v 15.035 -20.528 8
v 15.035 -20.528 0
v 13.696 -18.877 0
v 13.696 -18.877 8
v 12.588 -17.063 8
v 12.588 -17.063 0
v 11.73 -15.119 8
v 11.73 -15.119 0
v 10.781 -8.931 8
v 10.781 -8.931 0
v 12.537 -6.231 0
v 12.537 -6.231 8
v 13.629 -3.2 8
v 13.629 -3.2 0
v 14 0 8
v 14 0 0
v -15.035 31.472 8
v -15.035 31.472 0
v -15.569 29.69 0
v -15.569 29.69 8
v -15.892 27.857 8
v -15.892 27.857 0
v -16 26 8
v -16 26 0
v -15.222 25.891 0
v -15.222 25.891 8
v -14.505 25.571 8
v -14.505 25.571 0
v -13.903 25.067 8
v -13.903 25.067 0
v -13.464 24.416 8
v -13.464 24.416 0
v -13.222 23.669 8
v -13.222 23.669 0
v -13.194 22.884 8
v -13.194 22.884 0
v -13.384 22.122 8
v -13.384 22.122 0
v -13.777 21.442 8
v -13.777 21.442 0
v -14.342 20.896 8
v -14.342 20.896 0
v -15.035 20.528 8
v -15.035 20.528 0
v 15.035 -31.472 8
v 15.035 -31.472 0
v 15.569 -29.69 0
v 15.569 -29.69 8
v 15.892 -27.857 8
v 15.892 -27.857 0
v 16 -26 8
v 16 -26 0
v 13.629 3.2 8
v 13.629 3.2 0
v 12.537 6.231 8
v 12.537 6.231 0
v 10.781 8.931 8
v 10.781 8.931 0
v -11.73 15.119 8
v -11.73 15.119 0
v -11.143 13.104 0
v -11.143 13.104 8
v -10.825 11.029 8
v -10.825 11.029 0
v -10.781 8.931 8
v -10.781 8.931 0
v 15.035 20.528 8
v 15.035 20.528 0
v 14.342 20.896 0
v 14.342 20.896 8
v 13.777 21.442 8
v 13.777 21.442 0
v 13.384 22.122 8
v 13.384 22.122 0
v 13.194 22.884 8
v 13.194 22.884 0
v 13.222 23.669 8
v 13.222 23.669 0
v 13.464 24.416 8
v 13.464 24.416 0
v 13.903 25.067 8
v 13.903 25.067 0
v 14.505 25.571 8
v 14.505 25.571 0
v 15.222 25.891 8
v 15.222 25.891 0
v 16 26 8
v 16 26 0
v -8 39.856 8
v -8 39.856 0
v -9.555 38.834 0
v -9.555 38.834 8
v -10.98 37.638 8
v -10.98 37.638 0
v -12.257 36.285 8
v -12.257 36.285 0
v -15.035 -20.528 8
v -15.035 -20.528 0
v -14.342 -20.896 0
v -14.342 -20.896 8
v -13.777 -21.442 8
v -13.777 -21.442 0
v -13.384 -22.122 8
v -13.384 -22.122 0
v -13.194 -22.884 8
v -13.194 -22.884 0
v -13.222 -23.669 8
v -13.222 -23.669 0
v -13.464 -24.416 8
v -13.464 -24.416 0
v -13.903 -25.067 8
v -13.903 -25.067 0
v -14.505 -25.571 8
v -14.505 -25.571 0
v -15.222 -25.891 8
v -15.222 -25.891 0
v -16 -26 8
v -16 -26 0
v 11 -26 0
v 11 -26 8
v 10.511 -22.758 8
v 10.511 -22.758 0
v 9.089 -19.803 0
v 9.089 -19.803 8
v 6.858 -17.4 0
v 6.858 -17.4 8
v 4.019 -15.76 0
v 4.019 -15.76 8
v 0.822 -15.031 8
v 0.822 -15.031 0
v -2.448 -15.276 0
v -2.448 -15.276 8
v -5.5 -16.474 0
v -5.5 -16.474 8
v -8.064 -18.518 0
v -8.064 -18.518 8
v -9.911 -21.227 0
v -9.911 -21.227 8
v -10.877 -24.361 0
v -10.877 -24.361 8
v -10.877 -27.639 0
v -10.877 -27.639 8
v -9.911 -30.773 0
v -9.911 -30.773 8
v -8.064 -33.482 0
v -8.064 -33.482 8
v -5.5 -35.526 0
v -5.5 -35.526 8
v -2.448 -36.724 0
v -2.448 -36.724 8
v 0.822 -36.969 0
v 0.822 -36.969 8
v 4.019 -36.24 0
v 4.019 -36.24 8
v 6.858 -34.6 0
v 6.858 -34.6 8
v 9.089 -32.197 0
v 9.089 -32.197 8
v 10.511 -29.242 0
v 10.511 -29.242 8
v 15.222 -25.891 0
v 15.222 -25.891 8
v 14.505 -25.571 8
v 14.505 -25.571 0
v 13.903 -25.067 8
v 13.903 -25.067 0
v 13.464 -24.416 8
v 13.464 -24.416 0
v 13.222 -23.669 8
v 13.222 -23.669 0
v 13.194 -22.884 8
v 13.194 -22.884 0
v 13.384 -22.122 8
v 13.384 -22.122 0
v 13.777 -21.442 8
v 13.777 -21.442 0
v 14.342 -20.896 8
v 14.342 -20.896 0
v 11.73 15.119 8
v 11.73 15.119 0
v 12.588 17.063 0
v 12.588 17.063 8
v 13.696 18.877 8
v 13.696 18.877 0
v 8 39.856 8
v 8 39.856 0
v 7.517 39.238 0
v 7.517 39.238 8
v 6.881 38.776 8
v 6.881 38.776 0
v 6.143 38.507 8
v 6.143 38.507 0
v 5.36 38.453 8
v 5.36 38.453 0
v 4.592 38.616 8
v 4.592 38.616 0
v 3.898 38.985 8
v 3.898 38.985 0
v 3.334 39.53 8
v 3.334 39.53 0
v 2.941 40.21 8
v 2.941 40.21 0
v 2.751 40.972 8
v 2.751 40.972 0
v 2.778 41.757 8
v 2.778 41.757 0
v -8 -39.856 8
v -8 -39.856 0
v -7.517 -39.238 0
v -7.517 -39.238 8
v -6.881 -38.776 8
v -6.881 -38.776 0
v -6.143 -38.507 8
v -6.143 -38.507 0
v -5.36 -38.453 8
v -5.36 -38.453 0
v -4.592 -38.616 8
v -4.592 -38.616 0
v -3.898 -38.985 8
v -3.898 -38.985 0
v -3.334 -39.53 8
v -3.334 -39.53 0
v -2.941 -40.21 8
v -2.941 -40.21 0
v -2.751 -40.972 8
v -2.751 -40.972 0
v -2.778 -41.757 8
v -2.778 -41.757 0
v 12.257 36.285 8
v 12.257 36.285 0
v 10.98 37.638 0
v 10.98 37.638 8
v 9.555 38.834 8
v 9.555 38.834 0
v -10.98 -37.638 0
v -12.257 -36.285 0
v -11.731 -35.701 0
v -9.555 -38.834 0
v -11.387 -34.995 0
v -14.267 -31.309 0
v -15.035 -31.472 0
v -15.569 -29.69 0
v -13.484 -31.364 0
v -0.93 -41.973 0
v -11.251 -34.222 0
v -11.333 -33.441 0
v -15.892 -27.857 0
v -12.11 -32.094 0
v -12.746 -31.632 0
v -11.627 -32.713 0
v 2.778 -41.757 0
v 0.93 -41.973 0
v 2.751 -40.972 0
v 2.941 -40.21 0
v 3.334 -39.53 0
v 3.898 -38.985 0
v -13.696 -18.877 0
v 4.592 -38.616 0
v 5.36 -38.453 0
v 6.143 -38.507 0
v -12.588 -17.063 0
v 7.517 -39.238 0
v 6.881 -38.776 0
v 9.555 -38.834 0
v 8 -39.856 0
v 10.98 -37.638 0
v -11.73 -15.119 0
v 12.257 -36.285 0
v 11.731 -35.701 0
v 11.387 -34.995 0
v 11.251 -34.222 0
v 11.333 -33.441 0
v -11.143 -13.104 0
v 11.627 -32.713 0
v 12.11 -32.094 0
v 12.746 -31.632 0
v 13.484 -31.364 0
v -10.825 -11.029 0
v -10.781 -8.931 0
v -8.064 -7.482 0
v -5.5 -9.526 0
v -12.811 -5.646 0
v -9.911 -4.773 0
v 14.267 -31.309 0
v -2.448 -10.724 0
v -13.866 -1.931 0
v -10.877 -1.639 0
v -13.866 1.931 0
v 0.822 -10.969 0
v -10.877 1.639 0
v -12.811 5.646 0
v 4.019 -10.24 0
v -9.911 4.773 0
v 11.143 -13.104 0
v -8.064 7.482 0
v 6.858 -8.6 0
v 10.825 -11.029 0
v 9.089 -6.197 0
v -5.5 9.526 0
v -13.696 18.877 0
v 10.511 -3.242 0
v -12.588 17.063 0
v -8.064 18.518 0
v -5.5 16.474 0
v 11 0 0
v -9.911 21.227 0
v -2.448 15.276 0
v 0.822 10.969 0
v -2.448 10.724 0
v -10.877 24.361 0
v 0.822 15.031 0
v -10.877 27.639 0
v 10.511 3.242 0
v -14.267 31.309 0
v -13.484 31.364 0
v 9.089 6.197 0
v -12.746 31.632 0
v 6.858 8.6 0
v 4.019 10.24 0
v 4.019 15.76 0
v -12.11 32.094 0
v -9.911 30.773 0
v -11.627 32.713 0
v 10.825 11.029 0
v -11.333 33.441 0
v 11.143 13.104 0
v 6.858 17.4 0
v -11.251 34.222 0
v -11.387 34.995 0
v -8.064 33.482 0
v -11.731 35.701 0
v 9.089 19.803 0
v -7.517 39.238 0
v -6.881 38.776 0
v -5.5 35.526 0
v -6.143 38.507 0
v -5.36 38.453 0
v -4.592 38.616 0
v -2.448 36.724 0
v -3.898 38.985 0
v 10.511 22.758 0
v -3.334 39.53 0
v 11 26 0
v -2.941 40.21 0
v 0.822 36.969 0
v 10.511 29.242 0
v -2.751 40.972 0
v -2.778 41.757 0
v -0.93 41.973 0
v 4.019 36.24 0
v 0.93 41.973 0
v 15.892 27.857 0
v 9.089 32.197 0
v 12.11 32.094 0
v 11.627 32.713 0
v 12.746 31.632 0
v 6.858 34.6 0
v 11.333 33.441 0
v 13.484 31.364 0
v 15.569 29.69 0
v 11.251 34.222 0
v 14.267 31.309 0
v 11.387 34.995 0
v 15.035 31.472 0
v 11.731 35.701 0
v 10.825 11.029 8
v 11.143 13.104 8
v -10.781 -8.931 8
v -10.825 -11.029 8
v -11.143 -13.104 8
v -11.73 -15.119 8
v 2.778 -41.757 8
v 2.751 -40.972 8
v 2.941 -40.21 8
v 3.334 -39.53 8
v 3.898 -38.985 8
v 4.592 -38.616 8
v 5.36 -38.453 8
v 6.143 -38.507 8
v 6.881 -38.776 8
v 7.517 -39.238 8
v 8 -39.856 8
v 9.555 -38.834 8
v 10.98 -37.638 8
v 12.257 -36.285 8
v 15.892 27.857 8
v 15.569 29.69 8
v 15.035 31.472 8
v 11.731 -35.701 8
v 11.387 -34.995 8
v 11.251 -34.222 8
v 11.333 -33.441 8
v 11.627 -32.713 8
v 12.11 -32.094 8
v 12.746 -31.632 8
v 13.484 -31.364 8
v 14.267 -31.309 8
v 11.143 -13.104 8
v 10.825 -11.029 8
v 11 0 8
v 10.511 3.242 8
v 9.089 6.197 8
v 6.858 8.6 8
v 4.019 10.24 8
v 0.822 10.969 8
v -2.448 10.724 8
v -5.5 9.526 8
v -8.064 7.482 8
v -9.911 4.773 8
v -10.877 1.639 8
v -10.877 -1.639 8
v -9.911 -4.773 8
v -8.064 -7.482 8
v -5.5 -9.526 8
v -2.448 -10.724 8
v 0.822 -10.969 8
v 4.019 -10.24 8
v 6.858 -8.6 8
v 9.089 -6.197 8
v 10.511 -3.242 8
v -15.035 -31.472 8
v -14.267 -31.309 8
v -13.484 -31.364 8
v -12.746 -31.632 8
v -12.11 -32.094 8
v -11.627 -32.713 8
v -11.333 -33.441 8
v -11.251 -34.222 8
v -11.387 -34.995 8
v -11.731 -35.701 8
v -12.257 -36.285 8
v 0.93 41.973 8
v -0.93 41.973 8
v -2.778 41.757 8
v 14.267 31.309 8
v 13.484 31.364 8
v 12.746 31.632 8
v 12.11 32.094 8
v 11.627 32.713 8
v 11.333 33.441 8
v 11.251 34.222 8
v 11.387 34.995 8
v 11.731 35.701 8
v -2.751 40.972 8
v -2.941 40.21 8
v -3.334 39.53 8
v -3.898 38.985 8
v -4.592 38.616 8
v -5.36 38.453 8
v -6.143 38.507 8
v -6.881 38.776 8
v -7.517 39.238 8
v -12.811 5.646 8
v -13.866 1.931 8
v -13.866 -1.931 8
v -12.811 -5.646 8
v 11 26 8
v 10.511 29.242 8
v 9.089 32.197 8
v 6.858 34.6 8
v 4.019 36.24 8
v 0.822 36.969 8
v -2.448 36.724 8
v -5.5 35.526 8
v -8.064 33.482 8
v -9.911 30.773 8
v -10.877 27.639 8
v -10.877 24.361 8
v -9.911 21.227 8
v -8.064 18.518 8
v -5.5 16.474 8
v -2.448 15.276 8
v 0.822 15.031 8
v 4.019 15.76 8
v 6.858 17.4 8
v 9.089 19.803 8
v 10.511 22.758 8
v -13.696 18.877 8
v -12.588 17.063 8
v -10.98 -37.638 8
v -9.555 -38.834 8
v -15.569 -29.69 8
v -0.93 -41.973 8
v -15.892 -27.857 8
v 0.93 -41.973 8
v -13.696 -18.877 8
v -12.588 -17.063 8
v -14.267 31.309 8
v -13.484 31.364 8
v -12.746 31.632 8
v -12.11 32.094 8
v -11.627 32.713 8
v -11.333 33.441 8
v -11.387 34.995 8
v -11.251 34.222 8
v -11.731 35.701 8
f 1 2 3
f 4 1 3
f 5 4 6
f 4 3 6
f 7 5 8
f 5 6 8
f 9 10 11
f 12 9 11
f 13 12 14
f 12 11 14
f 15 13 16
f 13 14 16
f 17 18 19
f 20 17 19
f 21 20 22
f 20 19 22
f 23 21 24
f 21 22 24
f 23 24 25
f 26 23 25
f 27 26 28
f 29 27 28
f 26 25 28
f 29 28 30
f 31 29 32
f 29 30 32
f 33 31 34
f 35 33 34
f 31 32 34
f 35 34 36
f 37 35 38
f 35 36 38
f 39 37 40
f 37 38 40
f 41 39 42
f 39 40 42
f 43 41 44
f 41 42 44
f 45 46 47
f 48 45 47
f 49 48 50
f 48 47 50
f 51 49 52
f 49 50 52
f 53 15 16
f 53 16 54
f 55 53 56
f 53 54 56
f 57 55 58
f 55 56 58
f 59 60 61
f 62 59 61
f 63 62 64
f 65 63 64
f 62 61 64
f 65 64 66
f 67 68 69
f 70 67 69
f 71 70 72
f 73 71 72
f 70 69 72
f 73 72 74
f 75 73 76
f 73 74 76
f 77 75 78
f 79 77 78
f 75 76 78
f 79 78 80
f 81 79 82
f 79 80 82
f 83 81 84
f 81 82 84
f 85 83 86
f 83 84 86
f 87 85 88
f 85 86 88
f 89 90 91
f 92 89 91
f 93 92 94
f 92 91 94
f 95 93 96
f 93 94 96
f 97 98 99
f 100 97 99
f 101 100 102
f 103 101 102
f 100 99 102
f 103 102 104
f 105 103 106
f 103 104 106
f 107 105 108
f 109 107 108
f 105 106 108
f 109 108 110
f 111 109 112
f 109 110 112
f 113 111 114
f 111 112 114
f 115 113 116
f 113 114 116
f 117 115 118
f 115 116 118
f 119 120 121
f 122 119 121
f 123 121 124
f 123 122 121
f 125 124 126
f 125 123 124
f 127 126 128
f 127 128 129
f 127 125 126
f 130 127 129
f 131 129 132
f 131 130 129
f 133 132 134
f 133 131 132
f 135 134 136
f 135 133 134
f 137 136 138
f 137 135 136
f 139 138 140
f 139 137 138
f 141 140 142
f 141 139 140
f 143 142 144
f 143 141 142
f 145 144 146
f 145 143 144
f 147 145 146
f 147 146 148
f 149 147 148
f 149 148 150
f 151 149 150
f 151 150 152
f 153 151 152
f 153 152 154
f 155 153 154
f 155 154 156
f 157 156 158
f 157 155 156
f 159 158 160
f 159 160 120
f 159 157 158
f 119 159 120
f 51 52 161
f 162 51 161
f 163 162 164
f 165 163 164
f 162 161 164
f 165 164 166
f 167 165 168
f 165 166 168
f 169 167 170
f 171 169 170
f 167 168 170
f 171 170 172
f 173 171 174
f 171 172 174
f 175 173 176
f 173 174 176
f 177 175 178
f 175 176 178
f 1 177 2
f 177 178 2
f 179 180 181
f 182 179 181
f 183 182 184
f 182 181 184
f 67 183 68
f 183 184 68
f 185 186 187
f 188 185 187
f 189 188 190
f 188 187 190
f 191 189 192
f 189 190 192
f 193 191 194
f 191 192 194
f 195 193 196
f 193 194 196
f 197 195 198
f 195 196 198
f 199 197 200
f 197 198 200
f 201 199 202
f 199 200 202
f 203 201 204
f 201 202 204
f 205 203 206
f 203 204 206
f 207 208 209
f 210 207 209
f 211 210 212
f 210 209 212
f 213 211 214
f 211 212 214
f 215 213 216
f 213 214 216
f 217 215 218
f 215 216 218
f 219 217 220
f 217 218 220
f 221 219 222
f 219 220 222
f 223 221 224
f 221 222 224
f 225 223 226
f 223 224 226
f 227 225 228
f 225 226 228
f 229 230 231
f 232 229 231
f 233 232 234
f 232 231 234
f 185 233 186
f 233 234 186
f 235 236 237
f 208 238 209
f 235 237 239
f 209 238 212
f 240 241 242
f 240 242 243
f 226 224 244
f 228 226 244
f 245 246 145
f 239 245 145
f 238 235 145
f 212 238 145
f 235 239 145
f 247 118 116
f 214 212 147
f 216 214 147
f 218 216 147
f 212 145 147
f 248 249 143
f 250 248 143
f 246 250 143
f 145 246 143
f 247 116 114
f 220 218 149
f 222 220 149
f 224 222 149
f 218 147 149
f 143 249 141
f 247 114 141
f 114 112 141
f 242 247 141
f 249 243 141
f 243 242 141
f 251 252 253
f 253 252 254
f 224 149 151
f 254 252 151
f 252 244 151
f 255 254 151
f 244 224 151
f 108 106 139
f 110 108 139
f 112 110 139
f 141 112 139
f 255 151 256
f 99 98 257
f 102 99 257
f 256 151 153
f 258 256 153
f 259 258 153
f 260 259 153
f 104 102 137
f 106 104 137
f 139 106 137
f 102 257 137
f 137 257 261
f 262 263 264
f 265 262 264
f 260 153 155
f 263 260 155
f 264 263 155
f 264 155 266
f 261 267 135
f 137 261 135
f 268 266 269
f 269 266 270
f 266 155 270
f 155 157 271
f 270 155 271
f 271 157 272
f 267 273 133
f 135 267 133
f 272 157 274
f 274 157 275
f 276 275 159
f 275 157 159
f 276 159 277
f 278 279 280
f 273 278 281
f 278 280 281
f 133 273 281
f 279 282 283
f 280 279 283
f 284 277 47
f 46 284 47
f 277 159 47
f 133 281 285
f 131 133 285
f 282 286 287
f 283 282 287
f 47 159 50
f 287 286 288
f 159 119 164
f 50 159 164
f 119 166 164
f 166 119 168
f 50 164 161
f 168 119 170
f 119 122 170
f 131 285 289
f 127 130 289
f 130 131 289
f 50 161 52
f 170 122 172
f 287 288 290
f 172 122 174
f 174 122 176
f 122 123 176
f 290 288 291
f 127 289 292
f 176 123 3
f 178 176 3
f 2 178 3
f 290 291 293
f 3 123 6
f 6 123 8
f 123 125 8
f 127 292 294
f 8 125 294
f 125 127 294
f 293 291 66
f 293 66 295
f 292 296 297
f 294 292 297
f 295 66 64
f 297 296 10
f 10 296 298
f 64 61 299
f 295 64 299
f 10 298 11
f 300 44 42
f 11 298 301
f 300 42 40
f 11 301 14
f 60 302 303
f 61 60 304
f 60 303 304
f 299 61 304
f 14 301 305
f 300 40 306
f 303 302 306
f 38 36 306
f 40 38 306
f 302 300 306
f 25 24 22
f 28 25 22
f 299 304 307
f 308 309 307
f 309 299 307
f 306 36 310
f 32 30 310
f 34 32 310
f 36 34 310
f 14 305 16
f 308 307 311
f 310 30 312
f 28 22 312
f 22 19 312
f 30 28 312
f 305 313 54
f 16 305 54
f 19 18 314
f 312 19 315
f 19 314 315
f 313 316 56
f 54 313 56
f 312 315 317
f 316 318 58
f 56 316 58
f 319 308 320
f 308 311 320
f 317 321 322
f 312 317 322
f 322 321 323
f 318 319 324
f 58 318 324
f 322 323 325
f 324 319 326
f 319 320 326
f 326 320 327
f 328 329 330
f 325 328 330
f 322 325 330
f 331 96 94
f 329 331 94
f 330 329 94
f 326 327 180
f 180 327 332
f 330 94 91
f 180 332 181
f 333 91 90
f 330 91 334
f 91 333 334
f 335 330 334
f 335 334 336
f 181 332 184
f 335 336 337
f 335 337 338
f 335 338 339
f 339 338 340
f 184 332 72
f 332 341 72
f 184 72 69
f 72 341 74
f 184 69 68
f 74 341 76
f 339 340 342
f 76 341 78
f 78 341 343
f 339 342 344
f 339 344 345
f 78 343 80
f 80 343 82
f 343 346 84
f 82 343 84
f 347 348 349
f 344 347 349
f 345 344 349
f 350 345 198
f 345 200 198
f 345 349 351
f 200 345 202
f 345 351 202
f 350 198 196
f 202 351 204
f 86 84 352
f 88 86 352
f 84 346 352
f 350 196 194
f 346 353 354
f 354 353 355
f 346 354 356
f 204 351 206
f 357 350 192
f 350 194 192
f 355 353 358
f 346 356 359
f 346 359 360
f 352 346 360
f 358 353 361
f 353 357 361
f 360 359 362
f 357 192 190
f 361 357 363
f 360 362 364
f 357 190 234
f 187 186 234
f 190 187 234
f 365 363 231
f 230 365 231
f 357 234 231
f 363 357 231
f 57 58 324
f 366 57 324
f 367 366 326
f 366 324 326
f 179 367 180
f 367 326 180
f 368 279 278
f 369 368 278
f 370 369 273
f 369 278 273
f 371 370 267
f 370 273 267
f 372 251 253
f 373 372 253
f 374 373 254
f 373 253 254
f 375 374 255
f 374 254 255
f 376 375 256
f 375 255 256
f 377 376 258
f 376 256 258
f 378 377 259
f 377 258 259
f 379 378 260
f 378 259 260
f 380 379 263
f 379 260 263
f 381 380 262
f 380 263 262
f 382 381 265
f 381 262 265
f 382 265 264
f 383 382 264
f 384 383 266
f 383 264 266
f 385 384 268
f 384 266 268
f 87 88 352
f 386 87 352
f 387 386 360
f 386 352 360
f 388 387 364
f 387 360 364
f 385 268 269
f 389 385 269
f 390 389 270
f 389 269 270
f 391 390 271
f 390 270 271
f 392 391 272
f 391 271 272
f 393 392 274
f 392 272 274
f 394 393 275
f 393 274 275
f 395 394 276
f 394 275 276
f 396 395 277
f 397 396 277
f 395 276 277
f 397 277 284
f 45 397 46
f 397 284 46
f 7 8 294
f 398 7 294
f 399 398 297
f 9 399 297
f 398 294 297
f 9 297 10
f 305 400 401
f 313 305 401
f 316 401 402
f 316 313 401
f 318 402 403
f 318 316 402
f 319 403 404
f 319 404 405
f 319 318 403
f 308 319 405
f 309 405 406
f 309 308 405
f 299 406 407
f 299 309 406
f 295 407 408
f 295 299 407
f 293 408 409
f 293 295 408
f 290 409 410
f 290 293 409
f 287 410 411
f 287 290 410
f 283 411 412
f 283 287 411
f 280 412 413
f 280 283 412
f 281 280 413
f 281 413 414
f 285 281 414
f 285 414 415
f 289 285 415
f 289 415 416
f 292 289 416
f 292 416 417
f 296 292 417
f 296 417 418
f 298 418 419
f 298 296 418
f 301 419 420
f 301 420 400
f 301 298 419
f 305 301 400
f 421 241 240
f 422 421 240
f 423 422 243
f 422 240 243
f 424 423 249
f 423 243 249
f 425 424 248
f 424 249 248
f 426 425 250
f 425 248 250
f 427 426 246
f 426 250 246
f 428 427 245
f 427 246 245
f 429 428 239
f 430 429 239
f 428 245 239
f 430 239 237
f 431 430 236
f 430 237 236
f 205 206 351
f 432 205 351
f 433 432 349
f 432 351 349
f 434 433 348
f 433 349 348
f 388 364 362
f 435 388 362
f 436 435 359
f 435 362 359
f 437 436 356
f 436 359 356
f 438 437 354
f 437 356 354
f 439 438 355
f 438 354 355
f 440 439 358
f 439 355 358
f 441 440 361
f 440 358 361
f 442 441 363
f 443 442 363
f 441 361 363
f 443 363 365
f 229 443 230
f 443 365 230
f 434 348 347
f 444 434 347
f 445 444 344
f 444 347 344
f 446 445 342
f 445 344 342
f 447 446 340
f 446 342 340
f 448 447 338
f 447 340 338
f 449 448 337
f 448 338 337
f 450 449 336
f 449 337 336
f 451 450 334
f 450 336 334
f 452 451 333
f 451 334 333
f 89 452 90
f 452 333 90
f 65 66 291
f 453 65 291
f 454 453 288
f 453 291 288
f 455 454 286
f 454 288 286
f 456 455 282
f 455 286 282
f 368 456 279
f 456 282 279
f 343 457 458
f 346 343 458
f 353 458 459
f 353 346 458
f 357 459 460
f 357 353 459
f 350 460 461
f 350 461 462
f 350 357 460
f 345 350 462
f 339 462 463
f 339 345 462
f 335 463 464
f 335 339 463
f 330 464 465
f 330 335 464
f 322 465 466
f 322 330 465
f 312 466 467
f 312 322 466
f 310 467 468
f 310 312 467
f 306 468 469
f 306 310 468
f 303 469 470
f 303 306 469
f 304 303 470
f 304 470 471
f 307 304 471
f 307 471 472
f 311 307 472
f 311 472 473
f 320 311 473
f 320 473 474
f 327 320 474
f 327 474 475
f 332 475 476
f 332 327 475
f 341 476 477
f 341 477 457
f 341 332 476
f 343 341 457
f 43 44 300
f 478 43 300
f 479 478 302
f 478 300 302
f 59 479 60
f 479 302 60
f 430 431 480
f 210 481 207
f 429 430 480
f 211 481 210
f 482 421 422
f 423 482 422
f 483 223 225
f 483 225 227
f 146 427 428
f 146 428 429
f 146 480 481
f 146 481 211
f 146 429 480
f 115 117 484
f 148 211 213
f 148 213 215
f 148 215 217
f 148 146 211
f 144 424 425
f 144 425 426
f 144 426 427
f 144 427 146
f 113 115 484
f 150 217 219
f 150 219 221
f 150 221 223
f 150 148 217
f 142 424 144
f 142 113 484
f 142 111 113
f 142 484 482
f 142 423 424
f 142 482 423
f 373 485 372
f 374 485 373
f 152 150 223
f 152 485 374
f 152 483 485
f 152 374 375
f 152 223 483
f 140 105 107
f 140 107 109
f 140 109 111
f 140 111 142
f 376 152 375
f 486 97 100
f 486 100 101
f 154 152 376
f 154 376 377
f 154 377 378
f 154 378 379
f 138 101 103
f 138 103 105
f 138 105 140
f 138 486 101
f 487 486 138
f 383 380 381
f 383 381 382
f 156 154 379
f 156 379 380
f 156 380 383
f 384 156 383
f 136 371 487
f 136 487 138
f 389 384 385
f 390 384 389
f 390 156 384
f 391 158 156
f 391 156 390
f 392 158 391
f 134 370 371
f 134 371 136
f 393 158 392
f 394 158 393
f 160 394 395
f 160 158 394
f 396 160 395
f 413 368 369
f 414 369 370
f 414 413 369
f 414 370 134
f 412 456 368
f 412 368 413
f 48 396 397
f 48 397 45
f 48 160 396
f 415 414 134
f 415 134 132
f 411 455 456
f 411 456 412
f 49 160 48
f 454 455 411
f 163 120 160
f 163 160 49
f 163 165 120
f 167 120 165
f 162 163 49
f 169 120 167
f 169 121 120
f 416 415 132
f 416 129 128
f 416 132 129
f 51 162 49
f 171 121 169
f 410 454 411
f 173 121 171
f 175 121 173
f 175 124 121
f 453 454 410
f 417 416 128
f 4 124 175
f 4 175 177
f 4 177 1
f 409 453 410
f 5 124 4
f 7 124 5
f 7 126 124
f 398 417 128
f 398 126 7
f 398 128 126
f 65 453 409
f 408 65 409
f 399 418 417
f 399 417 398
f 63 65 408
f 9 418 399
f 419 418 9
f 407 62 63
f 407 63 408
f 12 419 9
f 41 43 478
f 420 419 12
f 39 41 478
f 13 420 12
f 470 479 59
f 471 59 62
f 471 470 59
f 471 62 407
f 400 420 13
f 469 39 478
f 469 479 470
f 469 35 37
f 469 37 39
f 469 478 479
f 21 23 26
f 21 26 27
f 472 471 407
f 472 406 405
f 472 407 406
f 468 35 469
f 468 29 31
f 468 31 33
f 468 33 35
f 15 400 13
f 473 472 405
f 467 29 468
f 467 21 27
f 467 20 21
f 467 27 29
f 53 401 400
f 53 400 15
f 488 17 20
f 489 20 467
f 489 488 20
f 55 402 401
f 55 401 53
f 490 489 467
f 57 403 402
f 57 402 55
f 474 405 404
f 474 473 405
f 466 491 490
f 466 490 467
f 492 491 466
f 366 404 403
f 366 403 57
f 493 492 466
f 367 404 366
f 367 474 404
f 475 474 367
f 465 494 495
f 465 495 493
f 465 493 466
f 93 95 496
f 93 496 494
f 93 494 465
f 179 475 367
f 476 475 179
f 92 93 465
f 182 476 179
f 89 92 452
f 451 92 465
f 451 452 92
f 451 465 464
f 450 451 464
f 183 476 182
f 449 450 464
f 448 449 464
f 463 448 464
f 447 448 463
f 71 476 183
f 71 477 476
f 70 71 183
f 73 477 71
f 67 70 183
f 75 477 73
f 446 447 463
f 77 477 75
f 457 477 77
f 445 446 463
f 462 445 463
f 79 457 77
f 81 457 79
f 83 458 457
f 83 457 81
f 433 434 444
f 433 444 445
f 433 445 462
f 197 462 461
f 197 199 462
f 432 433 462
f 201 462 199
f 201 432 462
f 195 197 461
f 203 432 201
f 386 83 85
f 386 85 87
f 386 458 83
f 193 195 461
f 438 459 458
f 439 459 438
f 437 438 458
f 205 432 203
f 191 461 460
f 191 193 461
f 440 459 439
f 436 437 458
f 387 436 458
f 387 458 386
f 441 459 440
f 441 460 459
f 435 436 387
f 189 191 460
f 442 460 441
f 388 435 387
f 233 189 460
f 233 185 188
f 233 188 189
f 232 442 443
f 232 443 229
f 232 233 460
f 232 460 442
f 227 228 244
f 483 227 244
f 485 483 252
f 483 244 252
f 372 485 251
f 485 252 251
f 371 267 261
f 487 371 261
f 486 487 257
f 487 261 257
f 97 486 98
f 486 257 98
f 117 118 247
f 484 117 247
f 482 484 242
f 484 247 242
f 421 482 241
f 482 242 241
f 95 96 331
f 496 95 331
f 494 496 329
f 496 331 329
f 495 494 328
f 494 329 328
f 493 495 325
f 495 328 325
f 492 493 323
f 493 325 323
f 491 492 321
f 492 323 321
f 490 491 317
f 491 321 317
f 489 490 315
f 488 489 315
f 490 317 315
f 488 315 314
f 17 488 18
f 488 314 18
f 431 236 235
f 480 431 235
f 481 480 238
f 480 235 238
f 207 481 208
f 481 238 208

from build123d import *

# Parameters (mm, degrees)
F0_R     = 11
F1_DEPTH = 8


with BuildPart() as f1:
    # F0 (on Top) → F1 (new body)
    with BuildSketch(Plane.XY):
        with BuildLine():
            ThreePointArc((-10.781154, 8.931222), (0, 14), (10.781154, 8.931222))
            ThreePointArc((10.781154, 8.931222), (10.950081, 12.071765), (11.730086, 15.11859))
            ThreePointArc((11.730086, 15.11859), (13.112032, 17.988443), (15.035082, 20.527678))
            ThreePointArc((15.035082, 20.527678), (13.221629, 23.66867), (16, 26))
            ThreePointArc((16, 26), (15.756924, 28.778371), (15.035082, 31.472322))
            ThreePointArc((15.035082, 31.472322), (11.626906, 32.712797), (12.256711, 36.284602))
            ThreePointArc((12.256711, 36.284602), (10.284602, 38.256711), (8, 39.856406))
            ThreePointArc((8, 39.856406), (4.591824, 38.615932), (2.778371, 41.756924))
            ThreePointArc((2.778371, 41.756924), (0, 42), (-2.778371, 41.756924))
            ThreePointArc((-2.778371, 41.756924), (-4.591824, 38.615932), (-8, 39.856406))
            ThreePointArc((-8, 39.856406), (-10.284602, 38.256711), (-12.256711, 36.284602))
            ThreePointArc((-12.256711, 36.284602), (-11.626906, 32.712797), (-15.035082, 31.472322))
            ThreePointArc((-15.035082, 31.472322), (-15.756924, 28.778371), (-16, 26))
            ThreePointArc((-16, 26), (-13.221629, 23.66867), (-15.035082, 20.527678))
            ThreePointArc((-15.035082, 20.527678), (-13.112032, 17.988443), (-11.730086, 15.11859))
            ThreePointArc((-11.730086, 15.11859), (-10.950081, 12.071765), (-10.781154, 8.931222))
        make_face()
        with Locations((0, 26)):
            Circle(F0_R, mode=Mode.SUBTRACT)
        with BuildLine():
            ThreePointArc((10.781154, -8.931222), (13.170728, -4.74678), (14, 0))
            ThreePointArc((14, 0), (13.170728, 4.74678), (10.781154, 8.931222))
            ThreePointArc((10.781154, 8.931222), (0, 14), (-10.781154, 8.931222))
            ThreePointArc((-10.781154, 8.931222), (-14, 0), (-10.781154, -8.931222))
            ThreePointArc((-10.781154, -8.931222), (0, -14), (10.781154, -8.931222))
        make_face()
        Circle(F0_R, mode=Mode.SUBTRACT)
        with BuildLine():
            ThreePointArc((11.730086, -15.11859), (10.950081, -12.071765), (10.781154, -8.931222))
            ThreePointArc((10.781154, -8.931222), (0, -14), (-10.781154, -8.931222))
            ThreePointArc((-10.781154, -8.931222), (-10.950081, -12.071765), (-11.730086, -15.11859))
            ThreePointArc((-11.730086, -15.11859), (-13.112032, -17.988443), (-15.035082, -20.527678))
            ThreePointArc((-15.035082, -20.527678), (-13.221629, -23.66867), (-16, -26))
            ThreePointArc((-16, -26), (-15.756924, -28.778371), (-15.035082, -31.472322))
            ThreePointArc((-15.035082, -31.472322), (-11.626906, -32.712797), (-12.256711, -36.284602))
            ThreePointArc((-12.256711, -36.284602), (-10.284602, -38.256711), (-8, -39.856406))
            ThreePointArc((-8, -39.856406), (-4.591824, -38.615932), (-2.778371, -41.756924))
            ThreePointArc((-2.778371, -41.756924), (0, -42), (2.778371, -41.756924))
            ThreePointArc((2.778371, -41.756924), (4.591824, -38.615932), (8, -39.856406))
            ThreePointArc((8, -39.856406), (10.284602, -38.256711), (12.256711, -36.284602))
            ThreePointArc((12.256711, -36.284602), (11.626906, -32.712797), (15.035082, -31.472322))
            ThreePointArc((15.035082, -31.472322), (15.756924, -28.778371), (16, -26))
            ThreePointArc((16, -26), (13.221629, -23.66867), (15.035082, -20.527678))
            ThreePointArc((15.035082, -20.527678), (13.112032, -17.988443), (11.730086, -15.11859))
        make_face()
        with Locations((0, -26)):
            Circle(F0_R, mode=Mode.SUBTRACT)
    extrude(amount=F1_DEPTH)


solid = f1.part
